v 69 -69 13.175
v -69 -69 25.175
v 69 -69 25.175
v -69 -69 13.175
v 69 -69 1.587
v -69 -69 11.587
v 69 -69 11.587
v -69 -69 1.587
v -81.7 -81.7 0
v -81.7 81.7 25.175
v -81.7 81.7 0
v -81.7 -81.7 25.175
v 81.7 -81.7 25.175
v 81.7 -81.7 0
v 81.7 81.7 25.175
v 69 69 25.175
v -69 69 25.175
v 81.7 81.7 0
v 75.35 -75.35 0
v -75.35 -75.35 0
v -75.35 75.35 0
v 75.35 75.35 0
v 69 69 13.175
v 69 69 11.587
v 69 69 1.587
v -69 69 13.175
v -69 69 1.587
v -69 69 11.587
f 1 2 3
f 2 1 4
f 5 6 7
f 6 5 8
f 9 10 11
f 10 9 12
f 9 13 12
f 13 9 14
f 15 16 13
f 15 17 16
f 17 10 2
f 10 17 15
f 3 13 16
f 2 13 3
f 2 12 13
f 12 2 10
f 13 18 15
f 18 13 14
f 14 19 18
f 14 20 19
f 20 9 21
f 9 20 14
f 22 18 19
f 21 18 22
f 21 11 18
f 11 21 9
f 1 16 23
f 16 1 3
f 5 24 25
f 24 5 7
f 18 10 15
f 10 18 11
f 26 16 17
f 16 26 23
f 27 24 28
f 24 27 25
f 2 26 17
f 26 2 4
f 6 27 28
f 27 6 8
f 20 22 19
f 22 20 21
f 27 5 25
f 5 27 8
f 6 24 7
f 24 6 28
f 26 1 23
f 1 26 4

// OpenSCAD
rake_pin=2;
rake_pins=4;
// pin to pin
rake_width=21;
rake_edge=6;

in=25.4;

groove_d=0.25*in;

//groove=0.25*in*1.1;
groove=0;

side=rake_edge*2+rake_width*6+groove_d*2;

top_h=12;
base_h=10;
wood=0.5*in;
base_wood=0.0625*in;

side_h=top_h+base_wood*2+base_h;

edge=side+wood*2-groove_d*2;

echo("side");
echo(side);
echo(side/in);

echo("edge");
echo(edge);
echo(edge/in);

saw_gap=0.25;

gardens=6;
cnc_edges=6;

total_edges=4*gardens;

cnc_rows=ceil(total_edges/cnc_edges);

cnc=edge*cnc_edges+saw_gap*3;

echo("cnc");
echo(cnc);
echo(cnc/in);


bit=in/4;

cut_gap=bit*3;

module base() {
    square([side,side],center=true);
}

module base_3d() { 
    linear_extrude(height=base_wood)
    base();
}

module side(x=edge) {
    square([x,side_h],center=true);
}

module side_grooves(x=edge) {
    translate([0,-side_h/2+base_wood/2])
    side_groove(x);

    translate([0,side_h/2-base_wood/2-top_h])
    side_groove(x);
}

module side_groove(x=edge) {
    square([x+base_wood*2,groove],center=true);
}


// RENDER stl
module assembled() {
    for(n=[0:90:359])
    rotate([0,0,n])
    translate([0,-side/2+groove_d,side_h/2])
    rotate([90,0,0])
    difference() {
        linear_extrude(height=wood)
        side();
        linear_extrude(height=groove_d)
        side_grooves();
    }

    color("lime")
    base_3d();
    color("lime")
    translate([0,0,base_wood+base_h]) base_3d();
}

// RENDER svg
module base_cutsheet() {
    gap=side+cut_gap;
    for(y=[0:gap:gap*gardens-1])
    for(x=[0:gap:gap])
    translate([x,y])
    base();
}

anchor=bit;

module cutsheet() {
    gap=side_h+cut_gap;

    translate([-cnc/2-cut_gap,gap*cnc_rows])
    //translate([-cnc/2-cut_gap,-side_h/2-cut_gap])
    circle(d=anchor);
    
    for(y=[0:gap:gap*cnc_rows-1])
    translate([0,y])
    children();
}

// RENDER svg
module side_cutsheet() {
    cutsheet()
    side(cnc);
}

// RENDER svg
module groove_cutsheet() {
    cutsheet()
    side_grooves(cnc);
}



//side_cutsheet();
//translate([0,0,1]) color("red") groove_cutsheet();

//base_cutsheet();

assembled();
